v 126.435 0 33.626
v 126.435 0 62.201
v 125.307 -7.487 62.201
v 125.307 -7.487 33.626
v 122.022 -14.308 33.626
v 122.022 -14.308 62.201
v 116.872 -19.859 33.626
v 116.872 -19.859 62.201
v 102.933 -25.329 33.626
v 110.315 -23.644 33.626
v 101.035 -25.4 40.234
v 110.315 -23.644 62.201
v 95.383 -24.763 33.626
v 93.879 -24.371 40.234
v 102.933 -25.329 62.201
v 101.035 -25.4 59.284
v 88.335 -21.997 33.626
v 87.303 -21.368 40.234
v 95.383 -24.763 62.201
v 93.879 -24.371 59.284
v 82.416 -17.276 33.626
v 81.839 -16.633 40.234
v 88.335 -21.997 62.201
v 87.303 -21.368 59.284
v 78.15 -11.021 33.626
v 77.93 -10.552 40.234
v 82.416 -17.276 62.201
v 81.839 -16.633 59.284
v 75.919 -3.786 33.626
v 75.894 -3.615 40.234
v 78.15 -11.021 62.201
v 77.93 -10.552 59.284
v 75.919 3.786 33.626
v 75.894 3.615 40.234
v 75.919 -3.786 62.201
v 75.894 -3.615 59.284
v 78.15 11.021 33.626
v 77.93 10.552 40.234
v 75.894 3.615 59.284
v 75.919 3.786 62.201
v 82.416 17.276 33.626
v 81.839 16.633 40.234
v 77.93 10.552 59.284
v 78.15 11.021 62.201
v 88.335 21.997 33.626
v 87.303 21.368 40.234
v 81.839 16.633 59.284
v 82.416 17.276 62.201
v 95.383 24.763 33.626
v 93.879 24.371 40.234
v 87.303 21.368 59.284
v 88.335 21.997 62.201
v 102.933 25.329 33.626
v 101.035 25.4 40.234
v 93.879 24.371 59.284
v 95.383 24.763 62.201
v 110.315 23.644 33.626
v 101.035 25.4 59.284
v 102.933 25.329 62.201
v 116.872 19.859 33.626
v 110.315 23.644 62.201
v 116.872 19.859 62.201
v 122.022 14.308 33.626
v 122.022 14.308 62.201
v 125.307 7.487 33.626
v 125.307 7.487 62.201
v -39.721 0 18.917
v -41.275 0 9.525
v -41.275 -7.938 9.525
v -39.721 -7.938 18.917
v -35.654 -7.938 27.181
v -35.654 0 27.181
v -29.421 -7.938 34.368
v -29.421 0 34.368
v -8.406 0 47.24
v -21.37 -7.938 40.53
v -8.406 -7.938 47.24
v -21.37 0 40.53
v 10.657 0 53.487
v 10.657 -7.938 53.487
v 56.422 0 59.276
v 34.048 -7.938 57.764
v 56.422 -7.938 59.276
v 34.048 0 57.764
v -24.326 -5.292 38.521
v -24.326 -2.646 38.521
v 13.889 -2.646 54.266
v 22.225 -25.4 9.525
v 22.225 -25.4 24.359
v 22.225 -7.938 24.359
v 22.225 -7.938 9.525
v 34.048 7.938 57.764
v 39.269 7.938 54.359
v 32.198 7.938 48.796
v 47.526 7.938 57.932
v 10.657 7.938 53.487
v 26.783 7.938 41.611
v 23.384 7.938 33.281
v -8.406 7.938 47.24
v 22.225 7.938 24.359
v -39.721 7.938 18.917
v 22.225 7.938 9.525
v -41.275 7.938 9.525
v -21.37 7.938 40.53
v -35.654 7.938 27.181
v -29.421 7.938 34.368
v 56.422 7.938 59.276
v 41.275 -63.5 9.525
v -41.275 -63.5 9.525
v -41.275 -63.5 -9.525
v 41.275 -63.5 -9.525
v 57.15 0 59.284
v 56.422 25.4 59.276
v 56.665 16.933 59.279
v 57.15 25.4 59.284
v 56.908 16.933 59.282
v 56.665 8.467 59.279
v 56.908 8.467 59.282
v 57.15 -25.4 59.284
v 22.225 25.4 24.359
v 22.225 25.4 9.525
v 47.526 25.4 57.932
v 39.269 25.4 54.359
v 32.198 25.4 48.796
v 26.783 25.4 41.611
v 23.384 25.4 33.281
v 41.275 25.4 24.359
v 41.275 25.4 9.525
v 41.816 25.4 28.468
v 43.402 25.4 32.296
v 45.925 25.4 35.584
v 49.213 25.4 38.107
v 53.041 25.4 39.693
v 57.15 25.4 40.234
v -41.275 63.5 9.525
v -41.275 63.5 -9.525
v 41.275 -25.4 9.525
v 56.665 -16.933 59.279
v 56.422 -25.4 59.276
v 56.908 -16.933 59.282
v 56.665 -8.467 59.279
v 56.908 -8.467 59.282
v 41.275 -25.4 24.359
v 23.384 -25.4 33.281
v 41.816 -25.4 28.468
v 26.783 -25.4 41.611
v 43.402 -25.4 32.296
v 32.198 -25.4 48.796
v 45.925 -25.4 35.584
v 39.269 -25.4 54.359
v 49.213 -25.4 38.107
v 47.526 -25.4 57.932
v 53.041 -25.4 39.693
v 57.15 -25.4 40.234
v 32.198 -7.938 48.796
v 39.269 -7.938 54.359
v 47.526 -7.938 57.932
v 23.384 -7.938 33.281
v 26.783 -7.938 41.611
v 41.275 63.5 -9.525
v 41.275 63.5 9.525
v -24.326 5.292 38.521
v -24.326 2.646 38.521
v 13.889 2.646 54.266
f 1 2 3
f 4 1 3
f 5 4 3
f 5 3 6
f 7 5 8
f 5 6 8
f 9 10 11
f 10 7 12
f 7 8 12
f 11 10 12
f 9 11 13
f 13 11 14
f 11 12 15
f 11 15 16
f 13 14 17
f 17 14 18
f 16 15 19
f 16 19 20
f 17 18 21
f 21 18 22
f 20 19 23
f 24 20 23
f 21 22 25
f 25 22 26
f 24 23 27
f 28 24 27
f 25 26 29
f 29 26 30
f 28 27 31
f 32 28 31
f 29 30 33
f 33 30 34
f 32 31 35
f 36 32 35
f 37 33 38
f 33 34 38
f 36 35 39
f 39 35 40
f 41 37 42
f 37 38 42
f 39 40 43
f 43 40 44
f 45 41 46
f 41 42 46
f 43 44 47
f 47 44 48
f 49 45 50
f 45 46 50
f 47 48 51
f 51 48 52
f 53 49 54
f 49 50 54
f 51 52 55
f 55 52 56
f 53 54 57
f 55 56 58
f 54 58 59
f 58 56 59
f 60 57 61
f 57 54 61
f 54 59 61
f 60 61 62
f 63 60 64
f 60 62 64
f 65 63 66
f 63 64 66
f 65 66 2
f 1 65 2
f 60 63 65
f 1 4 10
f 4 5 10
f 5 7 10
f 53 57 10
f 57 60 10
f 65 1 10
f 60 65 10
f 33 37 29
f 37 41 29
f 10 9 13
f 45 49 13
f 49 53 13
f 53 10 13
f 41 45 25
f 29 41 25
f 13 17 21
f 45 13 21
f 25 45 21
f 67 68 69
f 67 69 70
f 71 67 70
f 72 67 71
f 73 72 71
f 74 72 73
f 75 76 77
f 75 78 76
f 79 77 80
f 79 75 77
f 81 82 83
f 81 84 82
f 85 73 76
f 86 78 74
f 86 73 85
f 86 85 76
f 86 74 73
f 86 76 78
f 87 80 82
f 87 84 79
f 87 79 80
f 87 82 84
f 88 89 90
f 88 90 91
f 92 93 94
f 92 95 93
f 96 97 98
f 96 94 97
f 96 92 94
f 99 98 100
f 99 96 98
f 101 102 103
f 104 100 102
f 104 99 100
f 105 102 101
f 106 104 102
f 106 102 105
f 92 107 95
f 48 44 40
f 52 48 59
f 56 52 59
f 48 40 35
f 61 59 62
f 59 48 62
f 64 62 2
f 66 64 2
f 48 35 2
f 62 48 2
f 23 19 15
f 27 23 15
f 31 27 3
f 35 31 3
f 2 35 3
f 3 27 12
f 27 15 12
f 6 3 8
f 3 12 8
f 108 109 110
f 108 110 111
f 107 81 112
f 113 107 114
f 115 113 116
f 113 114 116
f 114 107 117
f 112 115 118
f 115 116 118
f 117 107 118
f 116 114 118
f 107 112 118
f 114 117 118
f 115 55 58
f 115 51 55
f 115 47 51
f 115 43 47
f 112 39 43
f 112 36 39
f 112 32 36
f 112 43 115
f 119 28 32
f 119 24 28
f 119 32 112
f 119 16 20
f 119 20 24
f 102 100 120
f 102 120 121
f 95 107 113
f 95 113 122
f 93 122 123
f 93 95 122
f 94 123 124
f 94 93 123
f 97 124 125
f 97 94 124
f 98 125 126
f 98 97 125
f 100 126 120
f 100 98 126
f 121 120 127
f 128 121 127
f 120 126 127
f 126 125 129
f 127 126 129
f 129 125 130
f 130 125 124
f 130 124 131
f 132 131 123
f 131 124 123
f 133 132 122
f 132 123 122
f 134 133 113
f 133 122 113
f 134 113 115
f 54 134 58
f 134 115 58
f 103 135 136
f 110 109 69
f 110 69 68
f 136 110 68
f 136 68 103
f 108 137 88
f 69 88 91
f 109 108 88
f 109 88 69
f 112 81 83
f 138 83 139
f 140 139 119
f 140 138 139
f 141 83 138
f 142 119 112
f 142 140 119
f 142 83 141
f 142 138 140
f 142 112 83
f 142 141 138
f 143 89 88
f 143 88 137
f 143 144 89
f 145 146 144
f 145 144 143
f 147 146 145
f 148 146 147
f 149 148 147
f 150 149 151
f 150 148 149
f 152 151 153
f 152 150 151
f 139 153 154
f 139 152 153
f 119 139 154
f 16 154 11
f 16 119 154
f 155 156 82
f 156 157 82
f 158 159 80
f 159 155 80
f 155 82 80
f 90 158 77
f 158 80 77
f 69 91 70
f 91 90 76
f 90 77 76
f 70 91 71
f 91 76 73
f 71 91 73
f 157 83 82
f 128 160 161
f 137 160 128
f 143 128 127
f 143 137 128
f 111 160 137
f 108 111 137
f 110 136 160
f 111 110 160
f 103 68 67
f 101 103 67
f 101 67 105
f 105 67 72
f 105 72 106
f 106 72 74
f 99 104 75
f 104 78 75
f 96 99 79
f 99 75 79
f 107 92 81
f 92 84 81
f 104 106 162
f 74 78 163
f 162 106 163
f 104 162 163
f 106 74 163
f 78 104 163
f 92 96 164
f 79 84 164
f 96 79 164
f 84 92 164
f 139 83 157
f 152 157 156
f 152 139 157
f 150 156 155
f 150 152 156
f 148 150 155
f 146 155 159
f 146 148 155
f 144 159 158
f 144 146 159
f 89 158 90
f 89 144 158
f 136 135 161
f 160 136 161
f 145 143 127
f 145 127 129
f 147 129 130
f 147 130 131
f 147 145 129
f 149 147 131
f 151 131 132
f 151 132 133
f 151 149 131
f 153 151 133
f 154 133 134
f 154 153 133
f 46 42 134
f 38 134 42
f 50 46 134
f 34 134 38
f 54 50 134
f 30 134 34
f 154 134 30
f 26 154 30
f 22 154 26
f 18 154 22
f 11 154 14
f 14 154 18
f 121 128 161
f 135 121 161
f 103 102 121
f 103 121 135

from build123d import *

# Parameters (mm, degrees)
F1_DEPTH = 63.5
F0_W     = 25.4
F0_H     = 19.05
F2_DEPTH = 25.4
F3_DEPTH = 7.9375


with BuildPart() as f1:
    # F0 (on Front) → F1 (new body, symmetric)
    with BuildSketch(Plane.XZ):
        Polygon((22.225, 9.525), (-41.275, 9.525), (-41.275, -9.525), (41.275, -9.525), (41.275, 9.525), align=None)
    extrude(amount=F1_DEPTH, both=True)

    # F0 (on Front) → F2 (join, symmetric)
    with BuildSketch(Plane.XZ):
        with BuildLine():
            Line((22.225, 24.3588639732), (22.225, 9.525))
            Line((22.225, 9.525), (41.275, 9.525))
            Line((41.275, 9.525), (41.275, 24.3588639732))
            ThreePointArc((41.275, 24.3588639732), (45.9246798487, 35.5841841245), (57.15, 40.2338639732))
            Line((57.15, 40.2338639732), (75.6350584984, 40.2338639732))
            Line((75.6350584984, 40.2338639732), (75.6350584984, 59.2838639732))
            Line((75.6350584984, 59.2838639732), (57.15, 59.2838639732))
            add(Edge.make_bspline(
                [(56.4216107745, 59.2762675727), (56.6651505672, 59.2792783634), (56.9079531463, 59.2818095803), (57.15, 59.2838639732)],
                knots=[109.6042187191, 109.6042187191, 109.6042187191, 109.6042187191, 110.287919415, 110.287919415, 110.287919415, 110.287919415], degree=3))
            ThreePointArc((56.4216107745, 59.2762675727), (32.1981000854, 48.7956869183), (22.225, 24.3588639732))
        make_face()
        with Locations((88.3350584984, 49.7588639732)):
            Rectangle(F0_W, F0_H)
    extrude(amount=F2_DEPTH, both=True)

    # F0 (on Front) → F3 (join, symmetric)
    with BuildSketch(Plane.XZ):
        with BuildLine():
            add(Edge.make_bspline(
                [(-41.275, 9.525), (-40.6081550387, 45.986200262), (17.3796895691, 58.793607011), (56.4216107745, 59.2762675727)],
                knots=[0, 0, 0, 0, 109.6042187191, 109.6042187191, 109.6042187191, 109.6042187191], degree=3))
            Line((-41.275, 9.525), (22.225, 9.525))
            Line((22.225, 9.525), (22.225, 24.3588639732))
            ThreePointArc((22.225, 24.3588639732), (32.1981000854, 48.7956869183), (56.4216107745, 59.2762675727))
        make_face()
    extrude(amount=F3_DEPTH, both=True)

    # F0 (on Front) → F4 (revolve)
    with BuildSketch(Plane.XZ):
        Polygon((101.0350584984, 62.2014122894), (101.0350584984, 59.2838639732), (101.0350584984, 40.2338639732), (101.0350584984, 33.6264122894), (126.4350584984, 33.6264122894), (126.4350584984, 62.2014122894), align=None)
    revolve(axis=Axis((101.0350584984, 0, 47.9139122894), (0, 0, -1)))


solid = f1.part
